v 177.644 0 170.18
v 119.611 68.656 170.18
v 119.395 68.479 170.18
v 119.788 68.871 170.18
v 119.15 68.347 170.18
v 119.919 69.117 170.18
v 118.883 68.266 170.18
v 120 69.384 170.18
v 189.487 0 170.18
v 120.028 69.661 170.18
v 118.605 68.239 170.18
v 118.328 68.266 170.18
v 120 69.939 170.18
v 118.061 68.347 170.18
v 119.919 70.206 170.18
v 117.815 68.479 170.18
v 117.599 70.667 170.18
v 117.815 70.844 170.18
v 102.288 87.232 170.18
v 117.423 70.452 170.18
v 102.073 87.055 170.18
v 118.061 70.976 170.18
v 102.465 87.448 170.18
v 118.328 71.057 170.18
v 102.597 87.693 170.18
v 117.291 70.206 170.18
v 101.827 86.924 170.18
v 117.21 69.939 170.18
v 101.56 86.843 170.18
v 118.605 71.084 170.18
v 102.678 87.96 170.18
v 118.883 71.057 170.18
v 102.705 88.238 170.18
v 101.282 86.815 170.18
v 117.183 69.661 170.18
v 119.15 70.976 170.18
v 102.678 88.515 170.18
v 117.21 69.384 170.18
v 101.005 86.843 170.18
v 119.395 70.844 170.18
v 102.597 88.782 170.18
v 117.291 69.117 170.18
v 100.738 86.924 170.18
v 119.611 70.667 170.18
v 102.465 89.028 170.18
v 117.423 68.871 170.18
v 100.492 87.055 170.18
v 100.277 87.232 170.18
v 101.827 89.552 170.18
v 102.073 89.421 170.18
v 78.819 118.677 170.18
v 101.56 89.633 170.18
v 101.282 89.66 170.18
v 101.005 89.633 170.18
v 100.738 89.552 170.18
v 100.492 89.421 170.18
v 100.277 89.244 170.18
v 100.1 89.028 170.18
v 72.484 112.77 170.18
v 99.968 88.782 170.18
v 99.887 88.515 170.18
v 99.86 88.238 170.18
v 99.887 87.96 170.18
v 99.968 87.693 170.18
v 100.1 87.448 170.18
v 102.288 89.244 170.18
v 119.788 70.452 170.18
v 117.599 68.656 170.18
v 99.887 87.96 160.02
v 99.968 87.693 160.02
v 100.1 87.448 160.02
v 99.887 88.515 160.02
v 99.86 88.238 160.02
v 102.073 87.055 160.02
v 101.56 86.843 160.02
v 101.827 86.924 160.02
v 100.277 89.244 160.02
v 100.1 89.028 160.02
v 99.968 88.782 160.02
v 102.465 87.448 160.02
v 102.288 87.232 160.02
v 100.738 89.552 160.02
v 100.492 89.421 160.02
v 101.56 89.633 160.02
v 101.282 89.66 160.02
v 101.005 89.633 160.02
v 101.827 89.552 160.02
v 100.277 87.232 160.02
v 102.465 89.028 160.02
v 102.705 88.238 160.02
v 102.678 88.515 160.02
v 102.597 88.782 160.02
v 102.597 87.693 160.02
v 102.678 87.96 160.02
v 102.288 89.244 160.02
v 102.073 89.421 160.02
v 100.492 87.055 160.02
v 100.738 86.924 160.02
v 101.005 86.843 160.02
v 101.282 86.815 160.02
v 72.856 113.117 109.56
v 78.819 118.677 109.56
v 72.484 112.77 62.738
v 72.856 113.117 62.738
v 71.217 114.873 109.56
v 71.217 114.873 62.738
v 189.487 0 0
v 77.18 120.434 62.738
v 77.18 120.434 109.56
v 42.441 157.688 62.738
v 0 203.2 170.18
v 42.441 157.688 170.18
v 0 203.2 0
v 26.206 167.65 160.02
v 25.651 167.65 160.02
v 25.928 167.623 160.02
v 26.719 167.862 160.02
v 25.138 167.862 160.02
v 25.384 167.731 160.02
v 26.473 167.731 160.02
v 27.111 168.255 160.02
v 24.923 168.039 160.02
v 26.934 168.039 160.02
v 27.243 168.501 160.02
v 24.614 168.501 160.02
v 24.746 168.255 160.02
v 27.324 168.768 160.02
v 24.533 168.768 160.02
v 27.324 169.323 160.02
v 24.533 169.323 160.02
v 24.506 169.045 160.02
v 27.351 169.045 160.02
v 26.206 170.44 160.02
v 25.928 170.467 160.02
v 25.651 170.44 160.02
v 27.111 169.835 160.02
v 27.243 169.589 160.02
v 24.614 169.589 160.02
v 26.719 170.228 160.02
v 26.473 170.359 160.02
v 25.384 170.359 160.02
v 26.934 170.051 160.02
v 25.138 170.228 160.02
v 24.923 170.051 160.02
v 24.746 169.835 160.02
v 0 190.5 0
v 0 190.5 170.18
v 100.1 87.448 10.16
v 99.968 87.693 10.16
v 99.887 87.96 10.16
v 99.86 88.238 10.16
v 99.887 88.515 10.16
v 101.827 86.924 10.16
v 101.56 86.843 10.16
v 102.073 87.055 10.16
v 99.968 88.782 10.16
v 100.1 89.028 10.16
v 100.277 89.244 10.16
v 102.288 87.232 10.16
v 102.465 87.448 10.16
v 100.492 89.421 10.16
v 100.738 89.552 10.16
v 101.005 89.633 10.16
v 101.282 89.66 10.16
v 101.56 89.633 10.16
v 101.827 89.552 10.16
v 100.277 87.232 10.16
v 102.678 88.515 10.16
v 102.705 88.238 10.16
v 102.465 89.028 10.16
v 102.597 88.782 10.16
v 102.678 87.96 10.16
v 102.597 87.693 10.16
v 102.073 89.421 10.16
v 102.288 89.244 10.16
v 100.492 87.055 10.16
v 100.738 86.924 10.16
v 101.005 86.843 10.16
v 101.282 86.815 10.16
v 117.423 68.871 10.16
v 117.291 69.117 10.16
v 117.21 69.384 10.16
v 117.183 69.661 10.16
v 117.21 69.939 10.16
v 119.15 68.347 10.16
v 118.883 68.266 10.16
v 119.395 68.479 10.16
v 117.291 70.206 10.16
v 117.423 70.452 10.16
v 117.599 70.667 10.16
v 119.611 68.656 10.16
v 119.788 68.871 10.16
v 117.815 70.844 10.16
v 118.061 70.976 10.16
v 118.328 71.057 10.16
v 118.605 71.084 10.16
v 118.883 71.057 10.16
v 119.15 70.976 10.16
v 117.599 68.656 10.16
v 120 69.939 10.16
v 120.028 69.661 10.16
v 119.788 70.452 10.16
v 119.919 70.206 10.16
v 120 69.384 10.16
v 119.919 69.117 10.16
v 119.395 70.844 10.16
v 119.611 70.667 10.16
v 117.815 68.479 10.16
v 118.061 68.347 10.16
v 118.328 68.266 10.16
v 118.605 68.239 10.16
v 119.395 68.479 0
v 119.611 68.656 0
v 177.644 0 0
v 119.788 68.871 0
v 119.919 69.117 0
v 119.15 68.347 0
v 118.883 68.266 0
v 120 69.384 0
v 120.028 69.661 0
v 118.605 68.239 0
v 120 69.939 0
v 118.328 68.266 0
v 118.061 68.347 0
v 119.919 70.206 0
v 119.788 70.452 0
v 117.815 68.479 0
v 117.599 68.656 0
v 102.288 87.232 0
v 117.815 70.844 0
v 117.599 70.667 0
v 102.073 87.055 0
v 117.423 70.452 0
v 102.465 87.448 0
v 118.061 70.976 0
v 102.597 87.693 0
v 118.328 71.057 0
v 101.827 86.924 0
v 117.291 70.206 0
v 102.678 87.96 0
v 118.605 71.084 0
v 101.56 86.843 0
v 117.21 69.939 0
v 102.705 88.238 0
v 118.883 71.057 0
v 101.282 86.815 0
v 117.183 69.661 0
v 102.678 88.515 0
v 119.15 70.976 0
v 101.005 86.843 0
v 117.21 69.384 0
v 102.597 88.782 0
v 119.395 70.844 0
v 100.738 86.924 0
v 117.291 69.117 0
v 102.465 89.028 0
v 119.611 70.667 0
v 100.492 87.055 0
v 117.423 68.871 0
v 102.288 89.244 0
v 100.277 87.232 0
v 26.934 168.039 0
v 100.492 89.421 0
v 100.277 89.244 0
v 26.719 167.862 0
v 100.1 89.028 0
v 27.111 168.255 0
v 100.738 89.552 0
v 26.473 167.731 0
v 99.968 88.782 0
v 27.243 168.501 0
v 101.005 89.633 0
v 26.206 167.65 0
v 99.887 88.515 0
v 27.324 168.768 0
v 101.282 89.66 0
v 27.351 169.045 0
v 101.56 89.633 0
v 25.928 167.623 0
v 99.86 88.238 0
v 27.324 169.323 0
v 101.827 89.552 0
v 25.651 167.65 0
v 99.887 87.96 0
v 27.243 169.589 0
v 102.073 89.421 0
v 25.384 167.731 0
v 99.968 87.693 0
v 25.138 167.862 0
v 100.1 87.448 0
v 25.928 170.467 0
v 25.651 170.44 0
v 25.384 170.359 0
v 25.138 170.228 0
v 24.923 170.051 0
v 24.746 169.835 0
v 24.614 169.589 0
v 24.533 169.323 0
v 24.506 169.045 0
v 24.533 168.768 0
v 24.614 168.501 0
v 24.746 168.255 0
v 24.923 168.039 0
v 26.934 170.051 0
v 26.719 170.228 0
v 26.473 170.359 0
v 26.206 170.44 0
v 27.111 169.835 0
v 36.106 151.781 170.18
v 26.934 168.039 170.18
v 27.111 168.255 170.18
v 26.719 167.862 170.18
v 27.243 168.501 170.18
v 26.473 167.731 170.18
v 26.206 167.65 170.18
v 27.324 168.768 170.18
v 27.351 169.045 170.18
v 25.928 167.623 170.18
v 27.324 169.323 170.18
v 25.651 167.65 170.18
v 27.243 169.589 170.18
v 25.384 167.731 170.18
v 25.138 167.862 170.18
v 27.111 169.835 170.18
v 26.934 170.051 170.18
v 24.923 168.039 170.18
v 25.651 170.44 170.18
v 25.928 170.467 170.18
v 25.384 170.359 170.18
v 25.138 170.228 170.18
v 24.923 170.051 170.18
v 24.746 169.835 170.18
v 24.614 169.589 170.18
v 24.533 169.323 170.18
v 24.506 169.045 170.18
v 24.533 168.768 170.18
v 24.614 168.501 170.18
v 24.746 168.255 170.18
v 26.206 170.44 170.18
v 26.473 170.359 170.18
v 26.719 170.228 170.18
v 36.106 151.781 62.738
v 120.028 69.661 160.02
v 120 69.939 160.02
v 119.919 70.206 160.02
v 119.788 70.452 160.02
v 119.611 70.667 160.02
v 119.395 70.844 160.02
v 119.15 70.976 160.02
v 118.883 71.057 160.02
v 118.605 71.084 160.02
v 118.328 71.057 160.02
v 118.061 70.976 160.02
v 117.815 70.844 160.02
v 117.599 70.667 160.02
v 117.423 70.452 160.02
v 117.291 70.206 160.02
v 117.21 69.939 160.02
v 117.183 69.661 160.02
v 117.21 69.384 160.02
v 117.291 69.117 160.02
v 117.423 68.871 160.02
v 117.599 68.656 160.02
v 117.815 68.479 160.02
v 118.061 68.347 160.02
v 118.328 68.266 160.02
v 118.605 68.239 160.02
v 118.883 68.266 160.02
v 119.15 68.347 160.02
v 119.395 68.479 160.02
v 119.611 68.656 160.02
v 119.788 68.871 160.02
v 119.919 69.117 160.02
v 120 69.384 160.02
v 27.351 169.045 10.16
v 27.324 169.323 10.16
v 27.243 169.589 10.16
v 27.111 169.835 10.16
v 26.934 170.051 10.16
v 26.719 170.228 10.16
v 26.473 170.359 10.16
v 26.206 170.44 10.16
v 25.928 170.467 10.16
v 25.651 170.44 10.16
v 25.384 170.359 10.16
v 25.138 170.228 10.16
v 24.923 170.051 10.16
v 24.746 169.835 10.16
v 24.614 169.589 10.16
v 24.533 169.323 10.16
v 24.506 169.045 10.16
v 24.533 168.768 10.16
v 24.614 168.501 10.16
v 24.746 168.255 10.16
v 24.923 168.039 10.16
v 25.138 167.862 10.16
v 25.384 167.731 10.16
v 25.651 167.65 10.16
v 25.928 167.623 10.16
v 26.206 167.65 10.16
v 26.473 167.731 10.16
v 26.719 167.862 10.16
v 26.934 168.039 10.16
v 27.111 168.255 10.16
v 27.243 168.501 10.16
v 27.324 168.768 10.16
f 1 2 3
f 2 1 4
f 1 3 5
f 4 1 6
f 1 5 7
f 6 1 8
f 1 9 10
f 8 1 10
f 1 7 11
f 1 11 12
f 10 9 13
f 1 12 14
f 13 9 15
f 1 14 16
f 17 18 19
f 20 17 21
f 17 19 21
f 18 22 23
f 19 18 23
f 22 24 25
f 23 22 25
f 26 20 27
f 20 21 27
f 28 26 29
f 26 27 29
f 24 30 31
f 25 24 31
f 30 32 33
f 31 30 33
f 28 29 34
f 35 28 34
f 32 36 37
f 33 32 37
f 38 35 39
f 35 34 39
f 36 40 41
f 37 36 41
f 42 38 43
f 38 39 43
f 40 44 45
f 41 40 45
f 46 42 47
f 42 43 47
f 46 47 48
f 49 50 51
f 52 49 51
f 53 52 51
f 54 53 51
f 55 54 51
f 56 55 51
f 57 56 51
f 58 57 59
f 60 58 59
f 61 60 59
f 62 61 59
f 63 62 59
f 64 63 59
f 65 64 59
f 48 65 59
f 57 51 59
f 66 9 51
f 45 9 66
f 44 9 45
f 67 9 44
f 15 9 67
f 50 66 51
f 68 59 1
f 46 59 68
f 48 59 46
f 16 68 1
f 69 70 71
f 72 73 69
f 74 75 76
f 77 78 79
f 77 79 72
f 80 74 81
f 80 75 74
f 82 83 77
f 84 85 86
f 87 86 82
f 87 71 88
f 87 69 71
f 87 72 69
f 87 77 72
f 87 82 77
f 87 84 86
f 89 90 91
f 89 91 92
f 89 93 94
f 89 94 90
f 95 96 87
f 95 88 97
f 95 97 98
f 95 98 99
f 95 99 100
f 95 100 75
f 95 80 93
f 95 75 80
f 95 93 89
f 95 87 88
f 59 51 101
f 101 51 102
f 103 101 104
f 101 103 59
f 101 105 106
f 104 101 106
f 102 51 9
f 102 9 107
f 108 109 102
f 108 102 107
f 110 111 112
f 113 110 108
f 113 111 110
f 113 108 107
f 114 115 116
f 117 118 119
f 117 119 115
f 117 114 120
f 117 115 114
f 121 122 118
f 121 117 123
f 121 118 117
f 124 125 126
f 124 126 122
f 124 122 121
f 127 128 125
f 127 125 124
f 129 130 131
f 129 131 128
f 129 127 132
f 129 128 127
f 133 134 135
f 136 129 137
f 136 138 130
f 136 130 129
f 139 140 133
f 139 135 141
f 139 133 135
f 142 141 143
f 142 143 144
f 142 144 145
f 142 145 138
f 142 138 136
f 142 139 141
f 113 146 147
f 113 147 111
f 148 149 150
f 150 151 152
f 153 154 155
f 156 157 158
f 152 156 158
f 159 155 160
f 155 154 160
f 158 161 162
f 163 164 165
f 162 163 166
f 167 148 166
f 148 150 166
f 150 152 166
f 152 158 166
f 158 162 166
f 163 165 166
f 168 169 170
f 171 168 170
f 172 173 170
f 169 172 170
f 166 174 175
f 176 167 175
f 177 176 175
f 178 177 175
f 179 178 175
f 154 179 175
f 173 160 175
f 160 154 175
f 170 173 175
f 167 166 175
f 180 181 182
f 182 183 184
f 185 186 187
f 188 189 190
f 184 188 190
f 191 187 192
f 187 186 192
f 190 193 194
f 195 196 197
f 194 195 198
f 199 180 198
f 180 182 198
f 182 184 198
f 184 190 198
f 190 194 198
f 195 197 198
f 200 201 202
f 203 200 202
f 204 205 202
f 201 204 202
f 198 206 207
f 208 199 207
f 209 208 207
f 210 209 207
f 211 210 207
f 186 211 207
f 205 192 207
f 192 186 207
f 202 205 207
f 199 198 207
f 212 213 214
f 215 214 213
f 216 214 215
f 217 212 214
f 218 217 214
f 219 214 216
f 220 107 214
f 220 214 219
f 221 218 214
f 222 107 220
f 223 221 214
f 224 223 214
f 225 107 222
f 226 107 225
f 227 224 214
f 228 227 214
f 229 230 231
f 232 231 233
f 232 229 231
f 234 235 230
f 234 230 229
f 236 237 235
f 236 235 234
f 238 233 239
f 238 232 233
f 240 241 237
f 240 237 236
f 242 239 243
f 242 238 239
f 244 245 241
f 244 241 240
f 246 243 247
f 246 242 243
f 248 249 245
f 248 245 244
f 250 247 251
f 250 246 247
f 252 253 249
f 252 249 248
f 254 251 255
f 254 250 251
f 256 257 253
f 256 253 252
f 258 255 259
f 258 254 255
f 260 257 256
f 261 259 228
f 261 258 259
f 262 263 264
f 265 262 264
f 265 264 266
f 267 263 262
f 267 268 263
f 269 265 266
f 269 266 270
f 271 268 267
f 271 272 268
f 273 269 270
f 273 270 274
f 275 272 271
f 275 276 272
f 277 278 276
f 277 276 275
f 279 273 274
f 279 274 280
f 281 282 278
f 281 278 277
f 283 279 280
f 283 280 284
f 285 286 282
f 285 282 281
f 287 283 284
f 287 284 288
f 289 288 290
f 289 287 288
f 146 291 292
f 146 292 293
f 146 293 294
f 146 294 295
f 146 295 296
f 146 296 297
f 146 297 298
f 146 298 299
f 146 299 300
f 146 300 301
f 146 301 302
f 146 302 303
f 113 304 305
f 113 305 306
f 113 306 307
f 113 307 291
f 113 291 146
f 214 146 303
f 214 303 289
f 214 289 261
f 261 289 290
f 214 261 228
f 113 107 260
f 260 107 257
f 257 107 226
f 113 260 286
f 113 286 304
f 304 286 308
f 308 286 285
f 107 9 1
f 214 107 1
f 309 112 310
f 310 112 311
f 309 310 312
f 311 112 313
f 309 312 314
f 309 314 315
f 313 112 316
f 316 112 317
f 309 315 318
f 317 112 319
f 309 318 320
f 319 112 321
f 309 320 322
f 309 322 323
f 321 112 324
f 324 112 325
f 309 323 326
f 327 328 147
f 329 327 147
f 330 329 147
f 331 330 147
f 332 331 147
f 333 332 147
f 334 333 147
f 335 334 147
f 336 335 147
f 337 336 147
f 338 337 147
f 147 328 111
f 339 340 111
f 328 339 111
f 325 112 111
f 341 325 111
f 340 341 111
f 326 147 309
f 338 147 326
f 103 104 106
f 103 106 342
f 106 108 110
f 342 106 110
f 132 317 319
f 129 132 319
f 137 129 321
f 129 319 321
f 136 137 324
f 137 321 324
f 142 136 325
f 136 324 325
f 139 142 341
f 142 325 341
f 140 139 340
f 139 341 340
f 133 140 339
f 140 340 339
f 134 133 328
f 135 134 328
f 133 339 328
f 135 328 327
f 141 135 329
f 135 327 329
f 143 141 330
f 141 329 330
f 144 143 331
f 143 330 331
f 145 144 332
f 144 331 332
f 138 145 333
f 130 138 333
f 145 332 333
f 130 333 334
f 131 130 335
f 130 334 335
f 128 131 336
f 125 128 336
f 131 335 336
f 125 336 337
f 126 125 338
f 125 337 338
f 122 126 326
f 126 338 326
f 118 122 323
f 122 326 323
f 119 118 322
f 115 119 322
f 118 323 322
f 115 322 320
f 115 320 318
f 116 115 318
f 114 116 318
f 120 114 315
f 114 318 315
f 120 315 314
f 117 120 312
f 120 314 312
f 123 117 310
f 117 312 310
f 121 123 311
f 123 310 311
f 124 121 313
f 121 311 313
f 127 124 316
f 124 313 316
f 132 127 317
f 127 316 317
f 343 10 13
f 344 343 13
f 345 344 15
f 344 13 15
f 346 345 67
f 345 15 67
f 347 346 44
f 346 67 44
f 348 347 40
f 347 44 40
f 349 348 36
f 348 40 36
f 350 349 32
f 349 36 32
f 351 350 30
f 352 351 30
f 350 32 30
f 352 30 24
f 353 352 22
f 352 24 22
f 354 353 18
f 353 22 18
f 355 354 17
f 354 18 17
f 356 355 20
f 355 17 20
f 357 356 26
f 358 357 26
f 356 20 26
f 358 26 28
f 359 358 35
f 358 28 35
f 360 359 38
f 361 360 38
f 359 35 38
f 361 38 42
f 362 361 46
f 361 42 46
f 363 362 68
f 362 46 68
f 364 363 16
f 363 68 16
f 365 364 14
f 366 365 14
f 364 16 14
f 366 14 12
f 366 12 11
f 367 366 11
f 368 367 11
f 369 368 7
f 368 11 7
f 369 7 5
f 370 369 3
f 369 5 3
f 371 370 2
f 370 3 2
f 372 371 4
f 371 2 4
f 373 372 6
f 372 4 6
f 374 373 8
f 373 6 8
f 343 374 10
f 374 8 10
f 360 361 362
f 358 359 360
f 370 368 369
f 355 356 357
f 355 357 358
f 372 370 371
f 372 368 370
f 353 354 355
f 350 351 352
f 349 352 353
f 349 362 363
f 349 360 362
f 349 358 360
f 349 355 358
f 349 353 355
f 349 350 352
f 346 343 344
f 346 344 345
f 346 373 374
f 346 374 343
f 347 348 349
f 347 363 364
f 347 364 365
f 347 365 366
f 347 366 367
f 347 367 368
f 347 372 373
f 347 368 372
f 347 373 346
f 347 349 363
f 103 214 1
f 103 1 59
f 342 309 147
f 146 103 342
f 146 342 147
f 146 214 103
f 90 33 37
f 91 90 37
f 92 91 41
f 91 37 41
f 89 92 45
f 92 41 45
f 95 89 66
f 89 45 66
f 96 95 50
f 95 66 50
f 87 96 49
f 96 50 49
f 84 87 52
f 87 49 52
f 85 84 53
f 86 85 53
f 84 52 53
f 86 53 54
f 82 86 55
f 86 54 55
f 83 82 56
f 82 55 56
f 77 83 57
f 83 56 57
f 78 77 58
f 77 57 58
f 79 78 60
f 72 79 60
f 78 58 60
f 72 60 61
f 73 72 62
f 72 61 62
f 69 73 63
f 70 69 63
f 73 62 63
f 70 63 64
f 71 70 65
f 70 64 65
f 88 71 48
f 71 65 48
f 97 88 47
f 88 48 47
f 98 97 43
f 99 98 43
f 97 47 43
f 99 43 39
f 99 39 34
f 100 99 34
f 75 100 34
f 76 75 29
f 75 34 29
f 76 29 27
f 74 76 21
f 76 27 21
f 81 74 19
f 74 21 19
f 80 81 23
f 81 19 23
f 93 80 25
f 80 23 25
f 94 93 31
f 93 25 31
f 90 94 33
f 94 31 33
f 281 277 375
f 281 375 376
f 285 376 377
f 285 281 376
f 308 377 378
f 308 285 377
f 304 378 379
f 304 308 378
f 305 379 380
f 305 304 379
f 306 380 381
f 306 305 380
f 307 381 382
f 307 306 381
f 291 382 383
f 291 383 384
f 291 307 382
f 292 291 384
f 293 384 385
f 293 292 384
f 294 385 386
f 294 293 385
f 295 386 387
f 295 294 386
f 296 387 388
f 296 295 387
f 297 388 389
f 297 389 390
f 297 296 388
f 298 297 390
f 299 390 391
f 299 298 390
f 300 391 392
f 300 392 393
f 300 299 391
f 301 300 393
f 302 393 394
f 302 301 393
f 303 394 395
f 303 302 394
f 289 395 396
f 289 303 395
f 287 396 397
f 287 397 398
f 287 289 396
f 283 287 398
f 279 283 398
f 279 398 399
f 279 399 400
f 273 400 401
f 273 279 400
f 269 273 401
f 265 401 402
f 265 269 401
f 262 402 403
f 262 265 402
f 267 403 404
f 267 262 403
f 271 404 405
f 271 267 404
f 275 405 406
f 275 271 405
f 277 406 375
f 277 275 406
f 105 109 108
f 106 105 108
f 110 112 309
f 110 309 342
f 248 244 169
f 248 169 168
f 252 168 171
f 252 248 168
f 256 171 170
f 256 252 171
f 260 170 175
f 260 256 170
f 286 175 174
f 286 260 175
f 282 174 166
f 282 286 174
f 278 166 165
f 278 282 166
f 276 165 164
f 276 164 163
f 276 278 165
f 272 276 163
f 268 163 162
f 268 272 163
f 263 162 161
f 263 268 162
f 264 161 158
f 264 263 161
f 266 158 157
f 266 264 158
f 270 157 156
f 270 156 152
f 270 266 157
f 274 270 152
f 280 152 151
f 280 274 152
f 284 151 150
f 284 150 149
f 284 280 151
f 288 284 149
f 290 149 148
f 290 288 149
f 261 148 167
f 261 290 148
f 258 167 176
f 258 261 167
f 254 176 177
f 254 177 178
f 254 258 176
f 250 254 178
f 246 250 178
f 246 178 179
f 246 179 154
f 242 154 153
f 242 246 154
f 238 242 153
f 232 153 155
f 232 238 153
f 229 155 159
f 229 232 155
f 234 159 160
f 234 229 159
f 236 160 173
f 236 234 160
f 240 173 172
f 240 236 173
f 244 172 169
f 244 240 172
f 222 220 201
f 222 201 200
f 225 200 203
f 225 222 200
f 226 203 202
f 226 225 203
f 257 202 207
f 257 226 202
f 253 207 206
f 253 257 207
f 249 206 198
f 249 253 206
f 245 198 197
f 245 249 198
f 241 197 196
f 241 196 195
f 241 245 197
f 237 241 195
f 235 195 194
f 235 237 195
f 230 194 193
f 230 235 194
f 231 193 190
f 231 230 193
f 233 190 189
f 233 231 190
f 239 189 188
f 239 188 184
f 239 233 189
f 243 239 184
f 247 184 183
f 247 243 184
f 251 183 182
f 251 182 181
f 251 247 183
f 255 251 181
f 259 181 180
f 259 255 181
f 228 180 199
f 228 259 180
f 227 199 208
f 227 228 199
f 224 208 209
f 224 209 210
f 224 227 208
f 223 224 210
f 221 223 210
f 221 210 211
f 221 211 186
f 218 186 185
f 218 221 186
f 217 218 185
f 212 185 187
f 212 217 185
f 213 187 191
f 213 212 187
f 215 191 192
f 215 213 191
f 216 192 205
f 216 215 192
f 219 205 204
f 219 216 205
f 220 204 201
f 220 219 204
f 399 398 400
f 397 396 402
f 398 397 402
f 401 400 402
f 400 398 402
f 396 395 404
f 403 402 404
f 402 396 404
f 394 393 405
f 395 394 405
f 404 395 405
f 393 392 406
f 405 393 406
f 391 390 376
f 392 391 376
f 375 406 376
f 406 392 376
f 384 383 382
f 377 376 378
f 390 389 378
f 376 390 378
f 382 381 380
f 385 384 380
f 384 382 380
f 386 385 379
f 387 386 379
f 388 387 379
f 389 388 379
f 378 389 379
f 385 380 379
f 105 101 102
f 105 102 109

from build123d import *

# Parameters (mm, degrees)
BOSS_EXTRUDE1_DEPTH = 170.18
SKETCH2_W           = 107.442
SKETCH2_H           = 53.34
CUT_EXTRUDE1_DEPTH  = 170.18
SKETCH3_W           = 46.821602836
SKETCH3_H           = 2.401895457
BOSS_EXTRUDE2_DEPTH = 8.1534
SKETCH4_R           = 1.4224
CUT_EXTRUDE2_DEPTH  = 10.16


with BuildPart() as part:
    # Sketch1 → Boss-Extrude1 (new body)
    with BuildSketch(Plane.XY):
        Polygon((189.487065503, 0), (177.644123909, 0), (0, 190.5), (0, 203.2), align=None)
    extrude(amount=BOSS_EXTRUDE1_DEPTH)

    # Sketch2 → Cut-Extrude1 (cut)
    with BuildSketch(Plane(origin=(101.352507506, 94.512742268, 0), x_dir=(0, 0, -1), z_dir=(0.7313537016191667, 0.6819983600625027, 0))):
        with Locations((-116.459, 59.711072169)):
            Rectangle(SKETCH2_W, SKETCH2_H)
    extrude(amount=-CUT_EXTRUDE1_DEPTH, mode=Mode.SUBTRACT)

    # Sketch3 → Boss-Extrude2 (add)
    with BuildSketch(Plane(origin=(101.352507506, 94.512742268, 0), x_dir=(0, 0, -1), z_dir=(0.7313537016191667, 0.6819983600625027, 0))):
        with Locations((-86.148801418, 34.242019898)):
            Rectangle(SKETCH3_W, SKETCH3_H)
    extrude(amount=-BOSS_EXTRUDE2_DEPTH)

    # Sketch4 → Cut-Extrude2 (cut)
    with BuildSketch(Plane.XY.offset(170.18)):
        with Locations((25.928493761, 169.045094592)):
            Circle(SKETCH4_R)
        with Locations((101.282492565, 88.2378241)):
            Circle(SKETCH4_R)
        with Locations((118.60525091, 69.661440079)):
            Circle(SKETCH4_R)
    cut_extrude2 = extrude(amount=-CUT_EXTRUDE2_DEPTH, mode=Mode.SUBTRACT)

    # Mirror1: Cut-Extrude2 across plane
    add(cut_extrude2.mirror(Plane.XY.offset(85.09)), mode=Mode.SUBTRACT)


solid = part.part
